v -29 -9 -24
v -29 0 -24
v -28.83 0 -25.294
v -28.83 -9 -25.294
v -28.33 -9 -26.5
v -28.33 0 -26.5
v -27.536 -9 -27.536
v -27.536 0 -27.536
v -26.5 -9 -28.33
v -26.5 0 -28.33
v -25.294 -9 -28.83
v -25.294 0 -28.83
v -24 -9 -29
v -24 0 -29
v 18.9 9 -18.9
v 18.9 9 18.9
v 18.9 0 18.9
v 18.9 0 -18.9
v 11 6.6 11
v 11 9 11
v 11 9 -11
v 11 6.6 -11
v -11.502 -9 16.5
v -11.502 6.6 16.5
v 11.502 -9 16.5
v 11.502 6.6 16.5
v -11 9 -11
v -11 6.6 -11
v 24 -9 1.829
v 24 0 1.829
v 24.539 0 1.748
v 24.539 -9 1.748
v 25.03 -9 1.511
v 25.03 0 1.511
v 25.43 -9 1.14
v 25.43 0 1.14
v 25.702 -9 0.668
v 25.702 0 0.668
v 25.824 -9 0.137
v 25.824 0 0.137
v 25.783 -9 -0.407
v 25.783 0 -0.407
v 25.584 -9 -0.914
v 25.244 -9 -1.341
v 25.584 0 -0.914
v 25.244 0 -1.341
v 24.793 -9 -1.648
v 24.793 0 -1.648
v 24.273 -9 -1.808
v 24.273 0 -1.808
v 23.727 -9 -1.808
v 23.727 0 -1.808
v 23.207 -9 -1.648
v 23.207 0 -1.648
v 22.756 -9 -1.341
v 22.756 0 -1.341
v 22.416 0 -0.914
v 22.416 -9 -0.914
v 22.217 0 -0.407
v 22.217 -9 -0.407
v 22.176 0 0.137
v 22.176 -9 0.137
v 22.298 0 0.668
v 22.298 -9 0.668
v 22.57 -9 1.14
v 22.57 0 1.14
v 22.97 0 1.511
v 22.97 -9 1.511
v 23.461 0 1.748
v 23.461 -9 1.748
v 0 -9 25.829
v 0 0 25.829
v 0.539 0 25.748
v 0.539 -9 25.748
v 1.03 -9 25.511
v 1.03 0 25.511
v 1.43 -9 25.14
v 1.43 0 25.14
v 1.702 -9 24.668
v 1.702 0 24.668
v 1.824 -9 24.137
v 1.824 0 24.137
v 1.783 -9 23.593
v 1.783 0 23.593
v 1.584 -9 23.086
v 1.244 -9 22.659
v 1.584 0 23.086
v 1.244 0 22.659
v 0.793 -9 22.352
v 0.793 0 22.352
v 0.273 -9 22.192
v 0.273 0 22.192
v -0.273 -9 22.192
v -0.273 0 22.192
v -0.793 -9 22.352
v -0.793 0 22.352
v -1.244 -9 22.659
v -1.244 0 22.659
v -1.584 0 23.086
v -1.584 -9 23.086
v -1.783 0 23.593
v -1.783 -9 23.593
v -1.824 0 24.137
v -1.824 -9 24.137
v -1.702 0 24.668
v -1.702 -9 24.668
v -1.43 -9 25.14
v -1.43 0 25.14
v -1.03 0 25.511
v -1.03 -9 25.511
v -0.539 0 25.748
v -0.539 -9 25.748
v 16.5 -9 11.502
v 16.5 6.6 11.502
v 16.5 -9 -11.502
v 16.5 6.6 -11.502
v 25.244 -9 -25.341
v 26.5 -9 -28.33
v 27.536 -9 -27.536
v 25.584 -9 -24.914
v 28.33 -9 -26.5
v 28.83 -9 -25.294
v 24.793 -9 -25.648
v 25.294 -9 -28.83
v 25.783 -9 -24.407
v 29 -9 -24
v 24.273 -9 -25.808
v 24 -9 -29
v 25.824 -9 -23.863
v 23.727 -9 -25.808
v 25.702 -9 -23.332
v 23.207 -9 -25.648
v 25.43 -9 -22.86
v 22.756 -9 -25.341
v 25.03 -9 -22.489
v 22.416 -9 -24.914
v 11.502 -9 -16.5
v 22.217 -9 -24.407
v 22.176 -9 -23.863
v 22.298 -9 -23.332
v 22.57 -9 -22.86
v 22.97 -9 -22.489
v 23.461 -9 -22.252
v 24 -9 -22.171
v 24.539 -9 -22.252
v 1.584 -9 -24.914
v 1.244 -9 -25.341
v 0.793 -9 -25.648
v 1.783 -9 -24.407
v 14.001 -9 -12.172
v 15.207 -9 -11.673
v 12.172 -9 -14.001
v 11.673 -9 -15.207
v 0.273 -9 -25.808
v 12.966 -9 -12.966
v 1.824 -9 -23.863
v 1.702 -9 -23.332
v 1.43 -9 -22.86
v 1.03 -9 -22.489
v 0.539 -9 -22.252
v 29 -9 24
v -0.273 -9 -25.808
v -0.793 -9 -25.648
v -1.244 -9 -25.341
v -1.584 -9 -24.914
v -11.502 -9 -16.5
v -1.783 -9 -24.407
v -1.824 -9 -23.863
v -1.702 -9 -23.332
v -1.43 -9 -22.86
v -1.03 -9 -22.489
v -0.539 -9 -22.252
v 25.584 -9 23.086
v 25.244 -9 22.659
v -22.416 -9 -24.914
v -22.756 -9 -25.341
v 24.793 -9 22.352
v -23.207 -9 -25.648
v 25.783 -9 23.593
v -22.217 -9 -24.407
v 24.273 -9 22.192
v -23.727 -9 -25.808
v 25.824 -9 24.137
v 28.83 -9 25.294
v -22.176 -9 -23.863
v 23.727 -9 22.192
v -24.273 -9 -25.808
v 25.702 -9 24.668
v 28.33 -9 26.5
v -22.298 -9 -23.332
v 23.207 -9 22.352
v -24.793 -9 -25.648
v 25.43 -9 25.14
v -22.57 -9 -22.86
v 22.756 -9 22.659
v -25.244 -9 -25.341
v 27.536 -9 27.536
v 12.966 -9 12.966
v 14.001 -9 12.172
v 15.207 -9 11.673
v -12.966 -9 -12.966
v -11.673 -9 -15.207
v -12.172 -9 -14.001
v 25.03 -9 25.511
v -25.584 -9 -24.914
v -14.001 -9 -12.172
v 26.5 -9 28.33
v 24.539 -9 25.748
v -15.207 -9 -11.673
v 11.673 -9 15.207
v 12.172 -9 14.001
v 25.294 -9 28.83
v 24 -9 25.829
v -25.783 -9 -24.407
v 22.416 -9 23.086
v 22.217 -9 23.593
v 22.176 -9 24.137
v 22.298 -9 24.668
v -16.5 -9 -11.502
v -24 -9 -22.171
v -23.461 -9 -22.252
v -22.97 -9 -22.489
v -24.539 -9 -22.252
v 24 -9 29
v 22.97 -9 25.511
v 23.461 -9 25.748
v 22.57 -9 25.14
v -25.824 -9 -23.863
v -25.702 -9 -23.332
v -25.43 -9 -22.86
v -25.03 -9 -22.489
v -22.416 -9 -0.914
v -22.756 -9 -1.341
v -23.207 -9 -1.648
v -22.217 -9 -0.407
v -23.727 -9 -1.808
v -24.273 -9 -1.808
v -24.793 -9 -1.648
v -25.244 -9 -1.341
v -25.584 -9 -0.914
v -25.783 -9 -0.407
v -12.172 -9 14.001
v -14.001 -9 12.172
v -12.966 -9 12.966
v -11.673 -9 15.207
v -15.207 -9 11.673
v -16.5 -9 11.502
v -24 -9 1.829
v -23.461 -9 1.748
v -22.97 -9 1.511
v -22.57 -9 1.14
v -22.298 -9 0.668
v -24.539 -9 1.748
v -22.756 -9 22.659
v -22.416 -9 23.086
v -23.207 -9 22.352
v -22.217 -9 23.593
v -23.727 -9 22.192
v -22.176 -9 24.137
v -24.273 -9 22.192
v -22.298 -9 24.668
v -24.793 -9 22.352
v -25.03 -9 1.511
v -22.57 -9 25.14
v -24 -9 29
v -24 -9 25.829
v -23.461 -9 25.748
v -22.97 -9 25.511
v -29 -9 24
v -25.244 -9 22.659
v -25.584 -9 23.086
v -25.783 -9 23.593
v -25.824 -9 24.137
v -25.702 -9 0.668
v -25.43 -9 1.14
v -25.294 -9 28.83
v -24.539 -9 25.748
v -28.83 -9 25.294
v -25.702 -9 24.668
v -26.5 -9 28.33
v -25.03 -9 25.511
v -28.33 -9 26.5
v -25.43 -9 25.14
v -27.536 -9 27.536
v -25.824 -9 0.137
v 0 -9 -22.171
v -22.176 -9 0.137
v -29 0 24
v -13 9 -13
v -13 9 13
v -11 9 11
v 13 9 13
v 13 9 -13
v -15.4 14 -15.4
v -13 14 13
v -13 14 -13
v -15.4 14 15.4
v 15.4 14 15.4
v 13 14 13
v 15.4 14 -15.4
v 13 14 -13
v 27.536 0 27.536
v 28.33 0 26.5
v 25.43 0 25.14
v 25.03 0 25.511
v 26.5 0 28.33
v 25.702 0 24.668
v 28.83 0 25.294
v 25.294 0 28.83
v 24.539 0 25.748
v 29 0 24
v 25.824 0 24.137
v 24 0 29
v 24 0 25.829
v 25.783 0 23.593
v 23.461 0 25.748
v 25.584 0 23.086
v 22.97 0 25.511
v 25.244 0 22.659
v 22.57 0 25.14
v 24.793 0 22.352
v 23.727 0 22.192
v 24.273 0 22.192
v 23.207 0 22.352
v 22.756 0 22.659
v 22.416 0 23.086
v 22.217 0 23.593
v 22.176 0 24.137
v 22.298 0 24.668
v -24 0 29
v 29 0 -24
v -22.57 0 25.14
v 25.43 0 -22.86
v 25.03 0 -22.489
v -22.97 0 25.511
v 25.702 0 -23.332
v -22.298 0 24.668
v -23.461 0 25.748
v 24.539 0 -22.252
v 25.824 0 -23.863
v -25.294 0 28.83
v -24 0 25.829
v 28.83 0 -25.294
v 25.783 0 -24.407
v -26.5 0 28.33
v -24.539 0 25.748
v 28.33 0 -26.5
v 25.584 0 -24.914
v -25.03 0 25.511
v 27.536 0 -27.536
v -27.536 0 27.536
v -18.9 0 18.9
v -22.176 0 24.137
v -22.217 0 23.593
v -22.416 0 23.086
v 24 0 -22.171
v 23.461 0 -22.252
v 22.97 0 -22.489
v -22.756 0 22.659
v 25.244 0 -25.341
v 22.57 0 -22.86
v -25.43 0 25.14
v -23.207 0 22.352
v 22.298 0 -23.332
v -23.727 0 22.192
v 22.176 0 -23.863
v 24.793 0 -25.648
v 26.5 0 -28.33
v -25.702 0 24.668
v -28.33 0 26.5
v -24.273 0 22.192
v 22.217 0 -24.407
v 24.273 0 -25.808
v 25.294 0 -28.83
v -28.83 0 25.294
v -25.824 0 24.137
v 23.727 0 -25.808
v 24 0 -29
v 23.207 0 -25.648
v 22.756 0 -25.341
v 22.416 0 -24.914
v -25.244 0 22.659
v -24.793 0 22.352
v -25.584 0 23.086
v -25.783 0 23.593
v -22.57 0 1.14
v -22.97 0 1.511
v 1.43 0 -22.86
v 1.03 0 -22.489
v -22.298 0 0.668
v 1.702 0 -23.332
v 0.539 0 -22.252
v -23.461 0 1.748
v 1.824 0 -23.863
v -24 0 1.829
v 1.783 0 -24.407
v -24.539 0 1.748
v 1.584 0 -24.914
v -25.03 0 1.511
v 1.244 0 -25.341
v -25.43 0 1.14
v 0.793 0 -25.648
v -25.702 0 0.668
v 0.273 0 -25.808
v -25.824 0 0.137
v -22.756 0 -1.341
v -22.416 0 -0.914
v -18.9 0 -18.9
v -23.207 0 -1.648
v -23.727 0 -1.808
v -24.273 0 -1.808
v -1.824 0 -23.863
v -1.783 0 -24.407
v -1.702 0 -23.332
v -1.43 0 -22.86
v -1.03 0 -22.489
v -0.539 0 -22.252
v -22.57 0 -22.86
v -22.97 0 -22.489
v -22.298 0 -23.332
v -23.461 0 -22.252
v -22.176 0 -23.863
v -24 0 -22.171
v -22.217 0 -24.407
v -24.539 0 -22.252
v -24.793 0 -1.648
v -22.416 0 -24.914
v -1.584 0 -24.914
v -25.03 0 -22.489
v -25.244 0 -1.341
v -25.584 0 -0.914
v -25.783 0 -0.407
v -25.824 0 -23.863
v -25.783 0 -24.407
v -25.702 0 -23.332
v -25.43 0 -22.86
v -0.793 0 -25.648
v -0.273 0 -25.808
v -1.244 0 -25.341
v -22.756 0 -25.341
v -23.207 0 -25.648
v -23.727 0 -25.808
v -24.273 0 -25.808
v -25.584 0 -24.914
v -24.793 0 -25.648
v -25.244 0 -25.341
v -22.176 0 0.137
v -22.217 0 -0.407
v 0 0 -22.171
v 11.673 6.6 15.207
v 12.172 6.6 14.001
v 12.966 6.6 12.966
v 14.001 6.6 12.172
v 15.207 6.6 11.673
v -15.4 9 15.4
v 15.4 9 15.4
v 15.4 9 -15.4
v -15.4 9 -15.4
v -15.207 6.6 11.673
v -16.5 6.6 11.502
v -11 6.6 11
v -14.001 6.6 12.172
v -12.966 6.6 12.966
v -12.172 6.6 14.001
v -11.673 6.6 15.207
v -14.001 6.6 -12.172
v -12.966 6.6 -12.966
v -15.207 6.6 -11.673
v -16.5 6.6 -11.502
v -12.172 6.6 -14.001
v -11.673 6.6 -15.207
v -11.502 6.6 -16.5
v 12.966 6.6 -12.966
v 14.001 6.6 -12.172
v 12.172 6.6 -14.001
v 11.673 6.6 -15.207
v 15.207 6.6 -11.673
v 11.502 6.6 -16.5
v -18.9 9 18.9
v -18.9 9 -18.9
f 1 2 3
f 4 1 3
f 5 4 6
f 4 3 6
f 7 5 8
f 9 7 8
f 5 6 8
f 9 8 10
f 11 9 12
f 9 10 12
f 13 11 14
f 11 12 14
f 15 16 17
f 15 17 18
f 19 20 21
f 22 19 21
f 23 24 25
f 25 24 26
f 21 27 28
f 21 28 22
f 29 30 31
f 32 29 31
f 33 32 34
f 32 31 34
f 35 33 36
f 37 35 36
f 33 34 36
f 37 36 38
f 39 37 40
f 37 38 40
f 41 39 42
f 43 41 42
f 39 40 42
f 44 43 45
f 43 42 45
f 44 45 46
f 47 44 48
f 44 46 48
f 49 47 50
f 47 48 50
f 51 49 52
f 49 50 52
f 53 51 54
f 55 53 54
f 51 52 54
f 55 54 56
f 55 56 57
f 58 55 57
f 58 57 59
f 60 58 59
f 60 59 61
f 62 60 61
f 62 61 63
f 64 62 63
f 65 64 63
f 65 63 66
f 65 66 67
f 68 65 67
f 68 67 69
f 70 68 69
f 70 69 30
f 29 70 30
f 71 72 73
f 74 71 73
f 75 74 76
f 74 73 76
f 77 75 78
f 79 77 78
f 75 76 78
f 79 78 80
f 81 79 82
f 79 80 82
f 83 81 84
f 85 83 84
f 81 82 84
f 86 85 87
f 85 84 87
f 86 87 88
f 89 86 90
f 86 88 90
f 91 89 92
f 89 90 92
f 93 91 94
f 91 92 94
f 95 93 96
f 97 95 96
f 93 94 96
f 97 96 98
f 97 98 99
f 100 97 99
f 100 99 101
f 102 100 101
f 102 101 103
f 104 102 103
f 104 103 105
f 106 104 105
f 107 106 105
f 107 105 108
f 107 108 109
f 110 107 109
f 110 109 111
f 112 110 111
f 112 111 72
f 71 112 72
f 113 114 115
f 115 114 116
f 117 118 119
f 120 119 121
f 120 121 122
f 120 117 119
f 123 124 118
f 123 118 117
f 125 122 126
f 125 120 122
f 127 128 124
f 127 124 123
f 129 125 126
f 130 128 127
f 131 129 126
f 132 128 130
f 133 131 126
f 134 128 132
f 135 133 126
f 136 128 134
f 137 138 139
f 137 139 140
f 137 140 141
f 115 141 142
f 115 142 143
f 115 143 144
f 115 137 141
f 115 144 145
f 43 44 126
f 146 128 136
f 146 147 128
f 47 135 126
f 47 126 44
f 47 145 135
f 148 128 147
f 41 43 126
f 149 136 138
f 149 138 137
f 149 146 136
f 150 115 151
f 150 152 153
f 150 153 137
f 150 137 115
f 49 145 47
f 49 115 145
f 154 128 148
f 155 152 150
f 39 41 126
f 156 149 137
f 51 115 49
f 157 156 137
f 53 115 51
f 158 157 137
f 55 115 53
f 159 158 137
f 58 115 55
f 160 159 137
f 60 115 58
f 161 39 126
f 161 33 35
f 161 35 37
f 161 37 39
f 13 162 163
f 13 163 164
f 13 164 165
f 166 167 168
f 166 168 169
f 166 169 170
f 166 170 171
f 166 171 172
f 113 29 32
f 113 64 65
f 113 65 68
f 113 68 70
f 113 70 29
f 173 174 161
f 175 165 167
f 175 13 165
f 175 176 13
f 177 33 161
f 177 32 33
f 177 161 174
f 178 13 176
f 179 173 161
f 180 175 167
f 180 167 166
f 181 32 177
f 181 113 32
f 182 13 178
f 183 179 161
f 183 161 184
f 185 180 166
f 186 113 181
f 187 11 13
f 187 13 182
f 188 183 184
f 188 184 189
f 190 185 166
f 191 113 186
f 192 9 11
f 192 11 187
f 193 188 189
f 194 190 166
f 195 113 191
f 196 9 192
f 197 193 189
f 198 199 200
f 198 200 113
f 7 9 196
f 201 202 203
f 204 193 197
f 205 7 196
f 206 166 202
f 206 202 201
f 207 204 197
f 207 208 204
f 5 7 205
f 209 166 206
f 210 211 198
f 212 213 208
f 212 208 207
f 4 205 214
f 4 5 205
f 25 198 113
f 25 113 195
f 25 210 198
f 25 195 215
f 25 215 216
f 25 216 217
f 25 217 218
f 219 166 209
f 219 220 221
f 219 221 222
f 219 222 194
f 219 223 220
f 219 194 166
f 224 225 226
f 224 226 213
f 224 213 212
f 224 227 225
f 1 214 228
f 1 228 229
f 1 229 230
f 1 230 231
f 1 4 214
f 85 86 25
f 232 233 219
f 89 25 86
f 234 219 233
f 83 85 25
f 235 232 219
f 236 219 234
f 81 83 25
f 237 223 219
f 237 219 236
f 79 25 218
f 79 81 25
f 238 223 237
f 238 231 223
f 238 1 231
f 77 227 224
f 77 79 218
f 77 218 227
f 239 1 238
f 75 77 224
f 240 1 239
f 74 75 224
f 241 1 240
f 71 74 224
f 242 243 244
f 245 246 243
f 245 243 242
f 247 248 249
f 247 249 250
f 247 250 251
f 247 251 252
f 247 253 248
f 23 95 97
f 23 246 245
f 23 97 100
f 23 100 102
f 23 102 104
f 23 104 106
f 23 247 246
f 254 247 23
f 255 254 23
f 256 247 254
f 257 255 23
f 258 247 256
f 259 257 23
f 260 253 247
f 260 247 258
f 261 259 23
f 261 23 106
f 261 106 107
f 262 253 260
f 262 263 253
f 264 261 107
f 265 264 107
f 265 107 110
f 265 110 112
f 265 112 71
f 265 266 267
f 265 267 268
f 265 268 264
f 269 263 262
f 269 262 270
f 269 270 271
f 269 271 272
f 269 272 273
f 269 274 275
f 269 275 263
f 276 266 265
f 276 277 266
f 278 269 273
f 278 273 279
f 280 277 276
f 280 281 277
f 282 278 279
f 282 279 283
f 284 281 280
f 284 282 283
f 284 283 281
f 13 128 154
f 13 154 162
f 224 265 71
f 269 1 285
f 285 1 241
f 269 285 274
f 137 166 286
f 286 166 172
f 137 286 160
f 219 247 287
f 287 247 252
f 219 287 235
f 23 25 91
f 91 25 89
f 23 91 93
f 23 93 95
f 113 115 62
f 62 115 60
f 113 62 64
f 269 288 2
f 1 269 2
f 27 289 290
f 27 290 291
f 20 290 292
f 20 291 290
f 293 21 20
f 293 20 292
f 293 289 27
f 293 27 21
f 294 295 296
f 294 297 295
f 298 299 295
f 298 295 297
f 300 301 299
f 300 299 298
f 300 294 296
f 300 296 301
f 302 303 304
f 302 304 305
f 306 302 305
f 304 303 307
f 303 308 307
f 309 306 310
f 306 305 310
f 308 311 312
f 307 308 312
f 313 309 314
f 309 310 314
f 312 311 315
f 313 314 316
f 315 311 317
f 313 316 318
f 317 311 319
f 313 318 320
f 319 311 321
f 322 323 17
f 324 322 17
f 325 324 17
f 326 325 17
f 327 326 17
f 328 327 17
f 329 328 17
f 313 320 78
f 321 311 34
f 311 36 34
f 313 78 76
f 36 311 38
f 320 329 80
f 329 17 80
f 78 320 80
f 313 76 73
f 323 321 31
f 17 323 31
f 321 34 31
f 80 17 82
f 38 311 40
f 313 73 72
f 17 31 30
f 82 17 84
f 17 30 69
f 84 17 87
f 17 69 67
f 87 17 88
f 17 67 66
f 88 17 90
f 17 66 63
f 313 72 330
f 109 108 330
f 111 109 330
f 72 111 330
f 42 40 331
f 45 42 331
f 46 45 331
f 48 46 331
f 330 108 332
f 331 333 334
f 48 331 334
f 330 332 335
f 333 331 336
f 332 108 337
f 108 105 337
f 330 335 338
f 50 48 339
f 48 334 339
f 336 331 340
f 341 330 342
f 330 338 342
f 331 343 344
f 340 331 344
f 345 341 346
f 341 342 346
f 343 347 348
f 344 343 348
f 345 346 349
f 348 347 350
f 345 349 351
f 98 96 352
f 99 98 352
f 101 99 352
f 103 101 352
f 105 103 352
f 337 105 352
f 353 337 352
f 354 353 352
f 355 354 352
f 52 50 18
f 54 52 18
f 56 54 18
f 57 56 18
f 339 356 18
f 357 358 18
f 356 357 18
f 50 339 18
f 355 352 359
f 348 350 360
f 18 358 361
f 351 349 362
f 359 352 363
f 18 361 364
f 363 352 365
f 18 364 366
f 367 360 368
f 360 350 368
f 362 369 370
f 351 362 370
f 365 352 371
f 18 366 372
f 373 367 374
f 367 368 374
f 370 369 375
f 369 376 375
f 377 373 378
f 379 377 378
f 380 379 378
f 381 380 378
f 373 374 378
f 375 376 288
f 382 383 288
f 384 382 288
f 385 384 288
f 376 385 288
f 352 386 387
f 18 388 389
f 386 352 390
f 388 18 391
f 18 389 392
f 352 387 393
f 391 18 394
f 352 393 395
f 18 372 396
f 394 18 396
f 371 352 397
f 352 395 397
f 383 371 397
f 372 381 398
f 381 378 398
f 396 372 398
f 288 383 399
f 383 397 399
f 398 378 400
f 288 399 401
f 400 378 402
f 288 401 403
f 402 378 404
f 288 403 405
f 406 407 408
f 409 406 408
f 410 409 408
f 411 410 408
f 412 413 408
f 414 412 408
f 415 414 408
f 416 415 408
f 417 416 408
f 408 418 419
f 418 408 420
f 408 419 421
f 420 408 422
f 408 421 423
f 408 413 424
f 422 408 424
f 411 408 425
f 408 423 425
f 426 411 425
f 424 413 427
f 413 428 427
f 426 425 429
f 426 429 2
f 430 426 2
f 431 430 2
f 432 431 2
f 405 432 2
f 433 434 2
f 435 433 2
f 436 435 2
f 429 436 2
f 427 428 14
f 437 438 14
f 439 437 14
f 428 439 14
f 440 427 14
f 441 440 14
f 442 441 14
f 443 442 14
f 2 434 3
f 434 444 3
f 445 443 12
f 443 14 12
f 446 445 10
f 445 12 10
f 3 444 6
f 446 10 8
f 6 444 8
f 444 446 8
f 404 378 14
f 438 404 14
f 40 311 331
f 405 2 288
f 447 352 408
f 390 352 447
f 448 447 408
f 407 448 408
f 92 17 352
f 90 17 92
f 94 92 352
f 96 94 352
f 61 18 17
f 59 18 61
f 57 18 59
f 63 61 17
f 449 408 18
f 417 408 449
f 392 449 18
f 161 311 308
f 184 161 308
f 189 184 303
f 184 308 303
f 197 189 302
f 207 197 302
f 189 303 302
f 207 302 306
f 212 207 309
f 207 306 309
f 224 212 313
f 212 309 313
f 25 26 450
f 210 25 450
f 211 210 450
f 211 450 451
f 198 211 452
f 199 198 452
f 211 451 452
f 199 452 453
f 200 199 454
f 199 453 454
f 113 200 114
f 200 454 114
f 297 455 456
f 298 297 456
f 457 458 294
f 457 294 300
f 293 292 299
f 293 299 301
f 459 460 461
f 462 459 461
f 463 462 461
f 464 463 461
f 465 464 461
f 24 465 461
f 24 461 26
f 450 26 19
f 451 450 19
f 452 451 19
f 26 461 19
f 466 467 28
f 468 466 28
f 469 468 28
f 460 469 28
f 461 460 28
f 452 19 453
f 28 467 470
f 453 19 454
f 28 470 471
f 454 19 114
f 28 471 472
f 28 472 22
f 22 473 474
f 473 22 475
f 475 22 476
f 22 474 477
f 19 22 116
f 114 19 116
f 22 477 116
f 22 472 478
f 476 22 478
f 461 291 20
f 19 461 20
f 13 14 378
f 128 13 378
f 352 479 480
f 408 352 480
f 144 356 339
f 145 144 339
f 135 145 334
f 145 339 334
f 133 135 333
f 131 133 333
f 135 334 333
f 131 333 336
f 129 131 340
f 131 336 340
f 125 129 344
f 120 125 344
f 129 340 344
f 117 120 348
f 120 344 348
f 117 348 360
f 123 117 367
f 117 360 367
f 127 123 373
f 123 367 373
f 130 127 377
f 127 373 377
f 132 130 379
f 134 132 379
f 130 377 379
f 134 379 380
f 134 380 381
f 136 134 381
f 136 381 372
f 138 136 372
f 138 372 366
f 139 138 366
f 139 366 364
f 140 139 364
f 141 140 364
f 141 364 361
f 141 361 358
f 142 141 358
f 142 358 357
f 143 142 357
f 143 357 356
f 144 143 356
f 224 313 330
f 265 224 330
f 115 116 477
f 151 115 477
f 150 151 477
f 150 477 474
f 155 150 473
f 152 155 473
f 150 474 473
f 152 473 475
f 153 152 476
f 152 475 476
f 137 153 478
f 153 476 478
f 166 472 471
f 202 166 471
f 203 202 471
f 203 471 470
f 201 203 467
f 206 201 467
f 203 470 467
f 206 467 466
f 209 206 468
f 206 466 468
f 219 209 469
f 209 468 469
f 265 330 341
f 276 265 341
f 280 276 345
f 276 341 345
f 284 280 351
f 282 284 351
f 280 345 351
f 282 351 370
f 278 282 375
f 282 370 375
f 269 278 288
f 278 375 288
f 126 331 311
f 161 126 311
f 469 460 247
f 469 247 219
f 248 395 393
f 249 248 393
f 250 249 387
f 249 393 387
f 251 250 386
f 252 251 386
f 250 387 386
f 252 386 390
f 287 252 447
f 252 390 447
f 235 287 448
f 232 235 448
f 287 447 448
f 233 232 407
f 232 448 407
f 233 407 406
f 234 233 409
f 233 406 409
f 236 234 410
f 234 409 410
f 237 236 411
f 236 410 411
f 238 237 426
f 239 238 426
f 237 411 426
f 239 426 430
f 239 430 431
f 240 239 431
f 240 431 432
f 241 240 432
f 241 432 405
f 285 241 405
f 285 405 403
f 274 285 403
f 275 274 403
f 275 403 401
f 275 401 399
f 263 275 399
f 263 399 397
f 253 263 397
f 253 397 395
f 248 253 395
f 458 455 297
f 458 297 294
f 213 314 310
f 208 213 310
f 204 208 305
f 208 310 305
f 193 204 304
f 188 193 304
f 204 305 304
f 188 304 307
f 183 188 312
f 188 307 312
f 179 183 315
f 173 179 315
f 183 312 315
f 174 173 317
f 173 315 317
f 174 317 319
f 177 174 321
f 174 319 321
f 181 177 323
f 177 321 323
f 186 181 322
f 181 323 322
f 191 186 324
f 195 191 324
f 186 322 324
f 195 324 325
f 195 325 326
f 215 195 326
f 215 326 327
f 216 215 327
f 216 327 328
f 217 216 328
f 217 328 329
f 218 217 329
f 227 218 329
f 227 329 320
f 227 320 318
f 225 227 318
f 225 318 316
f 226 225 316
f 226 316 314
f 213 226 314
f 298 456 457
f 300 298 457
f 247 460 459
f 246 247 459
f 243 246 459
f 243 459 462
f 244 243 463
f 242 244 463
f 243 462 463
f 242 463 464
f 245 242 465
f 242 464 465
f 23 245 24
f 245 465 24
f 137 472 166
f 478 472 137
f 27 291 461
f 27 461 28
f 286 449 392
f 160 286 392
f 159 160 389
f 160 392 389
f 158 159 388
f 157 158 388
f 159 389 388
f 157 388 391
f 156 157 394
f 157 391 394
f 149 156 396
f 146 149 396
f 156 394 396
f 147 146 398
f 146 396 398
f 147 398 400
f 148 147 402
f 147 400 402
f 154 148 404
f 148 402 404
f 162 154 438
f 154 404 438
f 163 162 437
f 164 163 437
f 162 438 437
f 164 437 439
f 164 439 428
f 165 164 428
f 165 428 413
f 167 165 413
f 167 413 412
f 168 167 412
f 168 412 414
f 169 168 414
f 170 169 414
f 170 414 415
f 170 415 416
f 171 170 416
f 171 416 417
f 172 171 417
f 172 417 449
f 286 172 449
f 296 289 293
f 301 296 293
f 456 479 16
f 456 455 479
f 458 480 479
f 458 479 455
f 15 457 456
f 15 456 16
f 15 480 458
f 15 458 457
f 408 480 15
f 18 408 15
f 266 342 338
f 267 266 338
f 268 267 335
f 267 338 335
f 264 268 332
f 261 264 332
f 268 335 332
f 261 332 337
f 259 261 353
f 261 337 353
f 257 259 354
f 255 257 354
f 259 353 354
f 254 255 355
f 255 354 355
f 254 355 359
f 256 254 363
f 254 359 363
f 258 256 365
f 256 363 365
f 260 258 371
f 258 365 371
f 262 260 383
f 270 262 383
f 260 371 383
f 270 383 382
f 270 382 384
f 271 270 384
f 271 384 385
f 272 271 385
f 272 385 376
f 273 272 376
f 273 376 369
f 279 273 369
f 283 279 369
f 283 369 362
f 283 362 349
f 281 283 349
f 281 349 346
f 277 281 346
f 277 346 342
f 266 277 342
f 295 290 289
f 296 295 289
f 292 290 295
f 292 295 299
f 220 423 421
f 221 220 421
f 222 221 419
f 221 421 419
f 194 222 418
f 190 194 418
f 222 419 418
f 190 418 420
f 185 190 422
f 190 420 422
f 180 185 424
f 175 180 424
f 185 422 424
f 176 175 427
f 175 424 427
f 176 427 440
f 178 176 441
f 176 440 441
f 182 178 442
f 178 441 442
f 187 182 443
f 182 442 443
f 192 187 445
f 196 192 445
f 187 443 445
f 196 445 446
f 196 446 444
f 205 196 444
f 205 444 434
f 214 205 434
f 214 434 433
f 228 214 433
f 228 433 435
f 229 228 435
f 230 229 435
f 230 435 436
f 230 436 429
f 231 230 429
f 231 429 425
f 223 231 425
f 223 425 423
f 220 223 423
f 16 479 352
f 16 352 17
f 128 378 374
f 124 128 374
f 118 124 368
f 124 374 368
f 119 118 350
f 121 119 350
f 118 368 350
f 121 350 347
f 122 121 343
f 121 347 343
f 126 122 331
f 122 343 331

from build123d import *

# Parameters (mm, degrees)
SKETCH1_W            = 37.8
SKETCH1_H            = 37.8
SKETCH1_W_2          = 33
SKETCH1_H_2          = 33
BOSS_EXTRUDE1_DEPTH  = 9
BOSS_EXTRUDE8_START  = 9
SKETCH8_W            = 37.8
SKETCH8_H            = 37.8
SKETCH8_W_2          = 30.8
SKETCH8_H_2          = 30.8
SKETCH8_W_3          = 26
SKETCH8_H_3          = 26
SKETCH8_W_4          = 22
SKETCH8_H_4          = 22
BOSS_EXTRUDE8_DEPTH  = 2.4
BOSS_EXTRUDE9_START  = 9
SKETCH8_3_W          = 30.8
SKETCH8_3_H          = 30.8
SKETCH8_3_W_2        = 26
SKETCH8_3_H_2        = 26
BOSS_EXTRUDE9_DEPTH  = 5
SKETCH8_4_R          = 1.8288
SKETCH8_4_W          = 37.8
SKETCH8_4_H          = 37.8
BOSS_EXTRUDE10_DEPTH = 9
SKETCH8_5_R          = 1.8288
CUT_EXTRUDE3_DEPTH   = 44.33589736
LPATTERN2_COUNT      = 3
LPATTERN2_PITCH      = 24
LPATTERN2_COUNT_DIR2 = 3
LPATTERN2_PITCH_DIR2 = 24
BOSS_EXTRUDE11_DEPTH = 15.6
CIRPATTERN3_COUNT    = 4


with BuildPart() as part:
    # Sketch1 → Boss-Extrude1 (new, symmetric)
    with BuildSketch(Plane(origin=(0, 0, 0), x_dir=(1, 0, 0), z_dir=(0, 1, 0))):
        Rectangle(SKETCH1_W, SKETCH1_H)
        Rectangle(SKETCH1_W_2, SKETCH1_H_2, mode=Mode.SUBTRACT)
    extrude(amount=BOSS_EXTRUDE1_DEPTH, both=True)

    # Sketch8 → Boss-Extrude8 (add)
    # profile 1 of 3: a face of its own
    with BuildSketch(Plane(origin=(0, 0, 0), x_dir=(1, 0, 0), z_dir=(0, 1, 0)).offset(BOSS_EXTRUDE8_START)):
        Rectangle(SKETCH8_W, SKETCH8_H)
        Rectangle(SKETCH8_W_2, SKETCH8_H_2, mode=Mode.SUBTRACT)
    # profile 2 of 3: a face of its own
    with BuildSketch(Plane(origin=(0, 0, 0), x_dir=(1, 0, 0), z_dir=(0, 1, 0)).offset(BOSS_EXTRUDE8_START)):
        Rectangle(SKETCH8_W_2, SKETCH8_H_2)
        Rectangle(SKETCH8_W_3, SKETCH8_H_3, mode=Mode.SUBTRACT)
    # profile 3 of 3: a face of its own
    with BuildSketch(Plane(origin=(0, 0, 0), x_dir=(1, 0, 0), z_dir=(0, 1, 0)).offset(BOSS_EXTRUDE8_START)):
        Rectangle(SKETCH8_W_3, SKETCH8_H_3)
        Rectangle(SKETCH8_W_4, SKETCH8_H_4, mode=Mode.SUBTRACT)
    extrude(amount=-BOSS_EXTRUDE8_DEPTH)

    # Sketch8<3> → Boss-Extrude9 (add)
    with BuildSketch(Plane(origin=(0, 0, 0), x_dir=(1, 0, 0), z_dir=(0, 1, 0)).offset(BOSS_EXTRUDE9_START)):
        Rectangle(SKETCH8_3_W, SKETCH8_3_H)
        Rectangle(SKETCH8_3_W_2, SKETCH8_3_H_2, mode=Mode.SUBTRACT)
    extrude(amount=BOSS_EXTRUDE9_DEPTH)

    # Sketch8<4> → Boss-Extrude10 (add)
    # profile 1 of 2: a face of its own
    with BuildSketch(Plane(origin=(0, 0, 0), x_dir=(1, 0, 0), z_dir=(0, 1, 0))):
        with BuildLine():
            ThreePointArc((-29, 24), (-27.535533906, 27.535533906), (-24, 29))
            Line((-24, 29), (24, 29))
            ThreePointArc((24, 29), (27.535533906, 27.535533906), (29, 24))
            Line((29, 24), (29, -24))
            ThreePointArc((29, -24), (27.535533906, -27.535533906), (24, -29))
            Line((24, -29), (-24, -29))
            ThreePointArc((-24, -29), (-27.535533906, -27.535533906), (-29, -24))
            Line((-29, -24), (-29, 24))
        make_face()
        with Locations((-24, 24)):
            Circle(SKETCH8_4_R, mode=Mode.SUBTRACT)
        Rectangle(SKETCH8_4_W, SKETCH8_4_H, mode=Mode.SUBTRACT)
    # profile 2 of 2: a face of its own
    with BuildSketch(Plane(origin=(0, 0, 0), x_dir=(1, 0, 0), z_dir=(0, 1, 0))):
        with Locations((-24, 24)):
            Circle(SKETCH8_4_R)
    extrude(amount=-BOSS_EXTRUDE10_DEPTH)

    # Sketch8<5> → Cut-Extrude3 (cut, through all)
    with BuildSketch(Plane(origin=(0, 0, 0), x_dir=(1, 0, 0), z_dir=(0, 1, 0))):
        with Locations(Location((-24, 24, 0), (0, 0, 270))):
            Circle(SKETCH8_5_R)
    cut_extrude3 = extrude(amount=-CUT_EXTRUDE3_DEPTH, mode=Mode.SUBTRACT)

    # LPattern2: Cut-Extrude3 3 × 3
    with Locations(*[(i * LPATTERN2_PITCH, 0, j * LPATTERN2_PITCH_DIR2) for i in range(LPATTERN2_COUNT) for j in range(LPATTERN2_COUNT_DIR2) if (i, j) != (0, 0)]):
        add(cut_extrude3, mode=Mode.SUBTRACT)

    # Sketch10 → Boss-Extrude11 (add)
    with BuildSketch(Plane.XZ.offset(-6.6)):
        with BuildLine():
            Line((-16.5, -11.502376006), (-16.5, -16.5))
            Line((-16.5, -16.5), (-11.502376006, -16.5))
            ThreePointArc((-11.502376006, -16.5), (-12.966146184, -12.966146184), (-16.5, -11.502376006))
        make_face()
    boss_extrude11 = extrude(amount=BOSS_EXTRUDE11_DEPTH)

    # CirPattern3: Boss-Extrude11 ×4 about axis
    cirpattern3_axis = Axis((0, 0, 0), (0, 1, 0))
    for i in range(1, CIRPATTERN3_COUNT):
        add(boss_extrude11.rotate(cirpattern3_axis, i * 360 / CIRPATTERN3_COUNT))


solid = part.part
